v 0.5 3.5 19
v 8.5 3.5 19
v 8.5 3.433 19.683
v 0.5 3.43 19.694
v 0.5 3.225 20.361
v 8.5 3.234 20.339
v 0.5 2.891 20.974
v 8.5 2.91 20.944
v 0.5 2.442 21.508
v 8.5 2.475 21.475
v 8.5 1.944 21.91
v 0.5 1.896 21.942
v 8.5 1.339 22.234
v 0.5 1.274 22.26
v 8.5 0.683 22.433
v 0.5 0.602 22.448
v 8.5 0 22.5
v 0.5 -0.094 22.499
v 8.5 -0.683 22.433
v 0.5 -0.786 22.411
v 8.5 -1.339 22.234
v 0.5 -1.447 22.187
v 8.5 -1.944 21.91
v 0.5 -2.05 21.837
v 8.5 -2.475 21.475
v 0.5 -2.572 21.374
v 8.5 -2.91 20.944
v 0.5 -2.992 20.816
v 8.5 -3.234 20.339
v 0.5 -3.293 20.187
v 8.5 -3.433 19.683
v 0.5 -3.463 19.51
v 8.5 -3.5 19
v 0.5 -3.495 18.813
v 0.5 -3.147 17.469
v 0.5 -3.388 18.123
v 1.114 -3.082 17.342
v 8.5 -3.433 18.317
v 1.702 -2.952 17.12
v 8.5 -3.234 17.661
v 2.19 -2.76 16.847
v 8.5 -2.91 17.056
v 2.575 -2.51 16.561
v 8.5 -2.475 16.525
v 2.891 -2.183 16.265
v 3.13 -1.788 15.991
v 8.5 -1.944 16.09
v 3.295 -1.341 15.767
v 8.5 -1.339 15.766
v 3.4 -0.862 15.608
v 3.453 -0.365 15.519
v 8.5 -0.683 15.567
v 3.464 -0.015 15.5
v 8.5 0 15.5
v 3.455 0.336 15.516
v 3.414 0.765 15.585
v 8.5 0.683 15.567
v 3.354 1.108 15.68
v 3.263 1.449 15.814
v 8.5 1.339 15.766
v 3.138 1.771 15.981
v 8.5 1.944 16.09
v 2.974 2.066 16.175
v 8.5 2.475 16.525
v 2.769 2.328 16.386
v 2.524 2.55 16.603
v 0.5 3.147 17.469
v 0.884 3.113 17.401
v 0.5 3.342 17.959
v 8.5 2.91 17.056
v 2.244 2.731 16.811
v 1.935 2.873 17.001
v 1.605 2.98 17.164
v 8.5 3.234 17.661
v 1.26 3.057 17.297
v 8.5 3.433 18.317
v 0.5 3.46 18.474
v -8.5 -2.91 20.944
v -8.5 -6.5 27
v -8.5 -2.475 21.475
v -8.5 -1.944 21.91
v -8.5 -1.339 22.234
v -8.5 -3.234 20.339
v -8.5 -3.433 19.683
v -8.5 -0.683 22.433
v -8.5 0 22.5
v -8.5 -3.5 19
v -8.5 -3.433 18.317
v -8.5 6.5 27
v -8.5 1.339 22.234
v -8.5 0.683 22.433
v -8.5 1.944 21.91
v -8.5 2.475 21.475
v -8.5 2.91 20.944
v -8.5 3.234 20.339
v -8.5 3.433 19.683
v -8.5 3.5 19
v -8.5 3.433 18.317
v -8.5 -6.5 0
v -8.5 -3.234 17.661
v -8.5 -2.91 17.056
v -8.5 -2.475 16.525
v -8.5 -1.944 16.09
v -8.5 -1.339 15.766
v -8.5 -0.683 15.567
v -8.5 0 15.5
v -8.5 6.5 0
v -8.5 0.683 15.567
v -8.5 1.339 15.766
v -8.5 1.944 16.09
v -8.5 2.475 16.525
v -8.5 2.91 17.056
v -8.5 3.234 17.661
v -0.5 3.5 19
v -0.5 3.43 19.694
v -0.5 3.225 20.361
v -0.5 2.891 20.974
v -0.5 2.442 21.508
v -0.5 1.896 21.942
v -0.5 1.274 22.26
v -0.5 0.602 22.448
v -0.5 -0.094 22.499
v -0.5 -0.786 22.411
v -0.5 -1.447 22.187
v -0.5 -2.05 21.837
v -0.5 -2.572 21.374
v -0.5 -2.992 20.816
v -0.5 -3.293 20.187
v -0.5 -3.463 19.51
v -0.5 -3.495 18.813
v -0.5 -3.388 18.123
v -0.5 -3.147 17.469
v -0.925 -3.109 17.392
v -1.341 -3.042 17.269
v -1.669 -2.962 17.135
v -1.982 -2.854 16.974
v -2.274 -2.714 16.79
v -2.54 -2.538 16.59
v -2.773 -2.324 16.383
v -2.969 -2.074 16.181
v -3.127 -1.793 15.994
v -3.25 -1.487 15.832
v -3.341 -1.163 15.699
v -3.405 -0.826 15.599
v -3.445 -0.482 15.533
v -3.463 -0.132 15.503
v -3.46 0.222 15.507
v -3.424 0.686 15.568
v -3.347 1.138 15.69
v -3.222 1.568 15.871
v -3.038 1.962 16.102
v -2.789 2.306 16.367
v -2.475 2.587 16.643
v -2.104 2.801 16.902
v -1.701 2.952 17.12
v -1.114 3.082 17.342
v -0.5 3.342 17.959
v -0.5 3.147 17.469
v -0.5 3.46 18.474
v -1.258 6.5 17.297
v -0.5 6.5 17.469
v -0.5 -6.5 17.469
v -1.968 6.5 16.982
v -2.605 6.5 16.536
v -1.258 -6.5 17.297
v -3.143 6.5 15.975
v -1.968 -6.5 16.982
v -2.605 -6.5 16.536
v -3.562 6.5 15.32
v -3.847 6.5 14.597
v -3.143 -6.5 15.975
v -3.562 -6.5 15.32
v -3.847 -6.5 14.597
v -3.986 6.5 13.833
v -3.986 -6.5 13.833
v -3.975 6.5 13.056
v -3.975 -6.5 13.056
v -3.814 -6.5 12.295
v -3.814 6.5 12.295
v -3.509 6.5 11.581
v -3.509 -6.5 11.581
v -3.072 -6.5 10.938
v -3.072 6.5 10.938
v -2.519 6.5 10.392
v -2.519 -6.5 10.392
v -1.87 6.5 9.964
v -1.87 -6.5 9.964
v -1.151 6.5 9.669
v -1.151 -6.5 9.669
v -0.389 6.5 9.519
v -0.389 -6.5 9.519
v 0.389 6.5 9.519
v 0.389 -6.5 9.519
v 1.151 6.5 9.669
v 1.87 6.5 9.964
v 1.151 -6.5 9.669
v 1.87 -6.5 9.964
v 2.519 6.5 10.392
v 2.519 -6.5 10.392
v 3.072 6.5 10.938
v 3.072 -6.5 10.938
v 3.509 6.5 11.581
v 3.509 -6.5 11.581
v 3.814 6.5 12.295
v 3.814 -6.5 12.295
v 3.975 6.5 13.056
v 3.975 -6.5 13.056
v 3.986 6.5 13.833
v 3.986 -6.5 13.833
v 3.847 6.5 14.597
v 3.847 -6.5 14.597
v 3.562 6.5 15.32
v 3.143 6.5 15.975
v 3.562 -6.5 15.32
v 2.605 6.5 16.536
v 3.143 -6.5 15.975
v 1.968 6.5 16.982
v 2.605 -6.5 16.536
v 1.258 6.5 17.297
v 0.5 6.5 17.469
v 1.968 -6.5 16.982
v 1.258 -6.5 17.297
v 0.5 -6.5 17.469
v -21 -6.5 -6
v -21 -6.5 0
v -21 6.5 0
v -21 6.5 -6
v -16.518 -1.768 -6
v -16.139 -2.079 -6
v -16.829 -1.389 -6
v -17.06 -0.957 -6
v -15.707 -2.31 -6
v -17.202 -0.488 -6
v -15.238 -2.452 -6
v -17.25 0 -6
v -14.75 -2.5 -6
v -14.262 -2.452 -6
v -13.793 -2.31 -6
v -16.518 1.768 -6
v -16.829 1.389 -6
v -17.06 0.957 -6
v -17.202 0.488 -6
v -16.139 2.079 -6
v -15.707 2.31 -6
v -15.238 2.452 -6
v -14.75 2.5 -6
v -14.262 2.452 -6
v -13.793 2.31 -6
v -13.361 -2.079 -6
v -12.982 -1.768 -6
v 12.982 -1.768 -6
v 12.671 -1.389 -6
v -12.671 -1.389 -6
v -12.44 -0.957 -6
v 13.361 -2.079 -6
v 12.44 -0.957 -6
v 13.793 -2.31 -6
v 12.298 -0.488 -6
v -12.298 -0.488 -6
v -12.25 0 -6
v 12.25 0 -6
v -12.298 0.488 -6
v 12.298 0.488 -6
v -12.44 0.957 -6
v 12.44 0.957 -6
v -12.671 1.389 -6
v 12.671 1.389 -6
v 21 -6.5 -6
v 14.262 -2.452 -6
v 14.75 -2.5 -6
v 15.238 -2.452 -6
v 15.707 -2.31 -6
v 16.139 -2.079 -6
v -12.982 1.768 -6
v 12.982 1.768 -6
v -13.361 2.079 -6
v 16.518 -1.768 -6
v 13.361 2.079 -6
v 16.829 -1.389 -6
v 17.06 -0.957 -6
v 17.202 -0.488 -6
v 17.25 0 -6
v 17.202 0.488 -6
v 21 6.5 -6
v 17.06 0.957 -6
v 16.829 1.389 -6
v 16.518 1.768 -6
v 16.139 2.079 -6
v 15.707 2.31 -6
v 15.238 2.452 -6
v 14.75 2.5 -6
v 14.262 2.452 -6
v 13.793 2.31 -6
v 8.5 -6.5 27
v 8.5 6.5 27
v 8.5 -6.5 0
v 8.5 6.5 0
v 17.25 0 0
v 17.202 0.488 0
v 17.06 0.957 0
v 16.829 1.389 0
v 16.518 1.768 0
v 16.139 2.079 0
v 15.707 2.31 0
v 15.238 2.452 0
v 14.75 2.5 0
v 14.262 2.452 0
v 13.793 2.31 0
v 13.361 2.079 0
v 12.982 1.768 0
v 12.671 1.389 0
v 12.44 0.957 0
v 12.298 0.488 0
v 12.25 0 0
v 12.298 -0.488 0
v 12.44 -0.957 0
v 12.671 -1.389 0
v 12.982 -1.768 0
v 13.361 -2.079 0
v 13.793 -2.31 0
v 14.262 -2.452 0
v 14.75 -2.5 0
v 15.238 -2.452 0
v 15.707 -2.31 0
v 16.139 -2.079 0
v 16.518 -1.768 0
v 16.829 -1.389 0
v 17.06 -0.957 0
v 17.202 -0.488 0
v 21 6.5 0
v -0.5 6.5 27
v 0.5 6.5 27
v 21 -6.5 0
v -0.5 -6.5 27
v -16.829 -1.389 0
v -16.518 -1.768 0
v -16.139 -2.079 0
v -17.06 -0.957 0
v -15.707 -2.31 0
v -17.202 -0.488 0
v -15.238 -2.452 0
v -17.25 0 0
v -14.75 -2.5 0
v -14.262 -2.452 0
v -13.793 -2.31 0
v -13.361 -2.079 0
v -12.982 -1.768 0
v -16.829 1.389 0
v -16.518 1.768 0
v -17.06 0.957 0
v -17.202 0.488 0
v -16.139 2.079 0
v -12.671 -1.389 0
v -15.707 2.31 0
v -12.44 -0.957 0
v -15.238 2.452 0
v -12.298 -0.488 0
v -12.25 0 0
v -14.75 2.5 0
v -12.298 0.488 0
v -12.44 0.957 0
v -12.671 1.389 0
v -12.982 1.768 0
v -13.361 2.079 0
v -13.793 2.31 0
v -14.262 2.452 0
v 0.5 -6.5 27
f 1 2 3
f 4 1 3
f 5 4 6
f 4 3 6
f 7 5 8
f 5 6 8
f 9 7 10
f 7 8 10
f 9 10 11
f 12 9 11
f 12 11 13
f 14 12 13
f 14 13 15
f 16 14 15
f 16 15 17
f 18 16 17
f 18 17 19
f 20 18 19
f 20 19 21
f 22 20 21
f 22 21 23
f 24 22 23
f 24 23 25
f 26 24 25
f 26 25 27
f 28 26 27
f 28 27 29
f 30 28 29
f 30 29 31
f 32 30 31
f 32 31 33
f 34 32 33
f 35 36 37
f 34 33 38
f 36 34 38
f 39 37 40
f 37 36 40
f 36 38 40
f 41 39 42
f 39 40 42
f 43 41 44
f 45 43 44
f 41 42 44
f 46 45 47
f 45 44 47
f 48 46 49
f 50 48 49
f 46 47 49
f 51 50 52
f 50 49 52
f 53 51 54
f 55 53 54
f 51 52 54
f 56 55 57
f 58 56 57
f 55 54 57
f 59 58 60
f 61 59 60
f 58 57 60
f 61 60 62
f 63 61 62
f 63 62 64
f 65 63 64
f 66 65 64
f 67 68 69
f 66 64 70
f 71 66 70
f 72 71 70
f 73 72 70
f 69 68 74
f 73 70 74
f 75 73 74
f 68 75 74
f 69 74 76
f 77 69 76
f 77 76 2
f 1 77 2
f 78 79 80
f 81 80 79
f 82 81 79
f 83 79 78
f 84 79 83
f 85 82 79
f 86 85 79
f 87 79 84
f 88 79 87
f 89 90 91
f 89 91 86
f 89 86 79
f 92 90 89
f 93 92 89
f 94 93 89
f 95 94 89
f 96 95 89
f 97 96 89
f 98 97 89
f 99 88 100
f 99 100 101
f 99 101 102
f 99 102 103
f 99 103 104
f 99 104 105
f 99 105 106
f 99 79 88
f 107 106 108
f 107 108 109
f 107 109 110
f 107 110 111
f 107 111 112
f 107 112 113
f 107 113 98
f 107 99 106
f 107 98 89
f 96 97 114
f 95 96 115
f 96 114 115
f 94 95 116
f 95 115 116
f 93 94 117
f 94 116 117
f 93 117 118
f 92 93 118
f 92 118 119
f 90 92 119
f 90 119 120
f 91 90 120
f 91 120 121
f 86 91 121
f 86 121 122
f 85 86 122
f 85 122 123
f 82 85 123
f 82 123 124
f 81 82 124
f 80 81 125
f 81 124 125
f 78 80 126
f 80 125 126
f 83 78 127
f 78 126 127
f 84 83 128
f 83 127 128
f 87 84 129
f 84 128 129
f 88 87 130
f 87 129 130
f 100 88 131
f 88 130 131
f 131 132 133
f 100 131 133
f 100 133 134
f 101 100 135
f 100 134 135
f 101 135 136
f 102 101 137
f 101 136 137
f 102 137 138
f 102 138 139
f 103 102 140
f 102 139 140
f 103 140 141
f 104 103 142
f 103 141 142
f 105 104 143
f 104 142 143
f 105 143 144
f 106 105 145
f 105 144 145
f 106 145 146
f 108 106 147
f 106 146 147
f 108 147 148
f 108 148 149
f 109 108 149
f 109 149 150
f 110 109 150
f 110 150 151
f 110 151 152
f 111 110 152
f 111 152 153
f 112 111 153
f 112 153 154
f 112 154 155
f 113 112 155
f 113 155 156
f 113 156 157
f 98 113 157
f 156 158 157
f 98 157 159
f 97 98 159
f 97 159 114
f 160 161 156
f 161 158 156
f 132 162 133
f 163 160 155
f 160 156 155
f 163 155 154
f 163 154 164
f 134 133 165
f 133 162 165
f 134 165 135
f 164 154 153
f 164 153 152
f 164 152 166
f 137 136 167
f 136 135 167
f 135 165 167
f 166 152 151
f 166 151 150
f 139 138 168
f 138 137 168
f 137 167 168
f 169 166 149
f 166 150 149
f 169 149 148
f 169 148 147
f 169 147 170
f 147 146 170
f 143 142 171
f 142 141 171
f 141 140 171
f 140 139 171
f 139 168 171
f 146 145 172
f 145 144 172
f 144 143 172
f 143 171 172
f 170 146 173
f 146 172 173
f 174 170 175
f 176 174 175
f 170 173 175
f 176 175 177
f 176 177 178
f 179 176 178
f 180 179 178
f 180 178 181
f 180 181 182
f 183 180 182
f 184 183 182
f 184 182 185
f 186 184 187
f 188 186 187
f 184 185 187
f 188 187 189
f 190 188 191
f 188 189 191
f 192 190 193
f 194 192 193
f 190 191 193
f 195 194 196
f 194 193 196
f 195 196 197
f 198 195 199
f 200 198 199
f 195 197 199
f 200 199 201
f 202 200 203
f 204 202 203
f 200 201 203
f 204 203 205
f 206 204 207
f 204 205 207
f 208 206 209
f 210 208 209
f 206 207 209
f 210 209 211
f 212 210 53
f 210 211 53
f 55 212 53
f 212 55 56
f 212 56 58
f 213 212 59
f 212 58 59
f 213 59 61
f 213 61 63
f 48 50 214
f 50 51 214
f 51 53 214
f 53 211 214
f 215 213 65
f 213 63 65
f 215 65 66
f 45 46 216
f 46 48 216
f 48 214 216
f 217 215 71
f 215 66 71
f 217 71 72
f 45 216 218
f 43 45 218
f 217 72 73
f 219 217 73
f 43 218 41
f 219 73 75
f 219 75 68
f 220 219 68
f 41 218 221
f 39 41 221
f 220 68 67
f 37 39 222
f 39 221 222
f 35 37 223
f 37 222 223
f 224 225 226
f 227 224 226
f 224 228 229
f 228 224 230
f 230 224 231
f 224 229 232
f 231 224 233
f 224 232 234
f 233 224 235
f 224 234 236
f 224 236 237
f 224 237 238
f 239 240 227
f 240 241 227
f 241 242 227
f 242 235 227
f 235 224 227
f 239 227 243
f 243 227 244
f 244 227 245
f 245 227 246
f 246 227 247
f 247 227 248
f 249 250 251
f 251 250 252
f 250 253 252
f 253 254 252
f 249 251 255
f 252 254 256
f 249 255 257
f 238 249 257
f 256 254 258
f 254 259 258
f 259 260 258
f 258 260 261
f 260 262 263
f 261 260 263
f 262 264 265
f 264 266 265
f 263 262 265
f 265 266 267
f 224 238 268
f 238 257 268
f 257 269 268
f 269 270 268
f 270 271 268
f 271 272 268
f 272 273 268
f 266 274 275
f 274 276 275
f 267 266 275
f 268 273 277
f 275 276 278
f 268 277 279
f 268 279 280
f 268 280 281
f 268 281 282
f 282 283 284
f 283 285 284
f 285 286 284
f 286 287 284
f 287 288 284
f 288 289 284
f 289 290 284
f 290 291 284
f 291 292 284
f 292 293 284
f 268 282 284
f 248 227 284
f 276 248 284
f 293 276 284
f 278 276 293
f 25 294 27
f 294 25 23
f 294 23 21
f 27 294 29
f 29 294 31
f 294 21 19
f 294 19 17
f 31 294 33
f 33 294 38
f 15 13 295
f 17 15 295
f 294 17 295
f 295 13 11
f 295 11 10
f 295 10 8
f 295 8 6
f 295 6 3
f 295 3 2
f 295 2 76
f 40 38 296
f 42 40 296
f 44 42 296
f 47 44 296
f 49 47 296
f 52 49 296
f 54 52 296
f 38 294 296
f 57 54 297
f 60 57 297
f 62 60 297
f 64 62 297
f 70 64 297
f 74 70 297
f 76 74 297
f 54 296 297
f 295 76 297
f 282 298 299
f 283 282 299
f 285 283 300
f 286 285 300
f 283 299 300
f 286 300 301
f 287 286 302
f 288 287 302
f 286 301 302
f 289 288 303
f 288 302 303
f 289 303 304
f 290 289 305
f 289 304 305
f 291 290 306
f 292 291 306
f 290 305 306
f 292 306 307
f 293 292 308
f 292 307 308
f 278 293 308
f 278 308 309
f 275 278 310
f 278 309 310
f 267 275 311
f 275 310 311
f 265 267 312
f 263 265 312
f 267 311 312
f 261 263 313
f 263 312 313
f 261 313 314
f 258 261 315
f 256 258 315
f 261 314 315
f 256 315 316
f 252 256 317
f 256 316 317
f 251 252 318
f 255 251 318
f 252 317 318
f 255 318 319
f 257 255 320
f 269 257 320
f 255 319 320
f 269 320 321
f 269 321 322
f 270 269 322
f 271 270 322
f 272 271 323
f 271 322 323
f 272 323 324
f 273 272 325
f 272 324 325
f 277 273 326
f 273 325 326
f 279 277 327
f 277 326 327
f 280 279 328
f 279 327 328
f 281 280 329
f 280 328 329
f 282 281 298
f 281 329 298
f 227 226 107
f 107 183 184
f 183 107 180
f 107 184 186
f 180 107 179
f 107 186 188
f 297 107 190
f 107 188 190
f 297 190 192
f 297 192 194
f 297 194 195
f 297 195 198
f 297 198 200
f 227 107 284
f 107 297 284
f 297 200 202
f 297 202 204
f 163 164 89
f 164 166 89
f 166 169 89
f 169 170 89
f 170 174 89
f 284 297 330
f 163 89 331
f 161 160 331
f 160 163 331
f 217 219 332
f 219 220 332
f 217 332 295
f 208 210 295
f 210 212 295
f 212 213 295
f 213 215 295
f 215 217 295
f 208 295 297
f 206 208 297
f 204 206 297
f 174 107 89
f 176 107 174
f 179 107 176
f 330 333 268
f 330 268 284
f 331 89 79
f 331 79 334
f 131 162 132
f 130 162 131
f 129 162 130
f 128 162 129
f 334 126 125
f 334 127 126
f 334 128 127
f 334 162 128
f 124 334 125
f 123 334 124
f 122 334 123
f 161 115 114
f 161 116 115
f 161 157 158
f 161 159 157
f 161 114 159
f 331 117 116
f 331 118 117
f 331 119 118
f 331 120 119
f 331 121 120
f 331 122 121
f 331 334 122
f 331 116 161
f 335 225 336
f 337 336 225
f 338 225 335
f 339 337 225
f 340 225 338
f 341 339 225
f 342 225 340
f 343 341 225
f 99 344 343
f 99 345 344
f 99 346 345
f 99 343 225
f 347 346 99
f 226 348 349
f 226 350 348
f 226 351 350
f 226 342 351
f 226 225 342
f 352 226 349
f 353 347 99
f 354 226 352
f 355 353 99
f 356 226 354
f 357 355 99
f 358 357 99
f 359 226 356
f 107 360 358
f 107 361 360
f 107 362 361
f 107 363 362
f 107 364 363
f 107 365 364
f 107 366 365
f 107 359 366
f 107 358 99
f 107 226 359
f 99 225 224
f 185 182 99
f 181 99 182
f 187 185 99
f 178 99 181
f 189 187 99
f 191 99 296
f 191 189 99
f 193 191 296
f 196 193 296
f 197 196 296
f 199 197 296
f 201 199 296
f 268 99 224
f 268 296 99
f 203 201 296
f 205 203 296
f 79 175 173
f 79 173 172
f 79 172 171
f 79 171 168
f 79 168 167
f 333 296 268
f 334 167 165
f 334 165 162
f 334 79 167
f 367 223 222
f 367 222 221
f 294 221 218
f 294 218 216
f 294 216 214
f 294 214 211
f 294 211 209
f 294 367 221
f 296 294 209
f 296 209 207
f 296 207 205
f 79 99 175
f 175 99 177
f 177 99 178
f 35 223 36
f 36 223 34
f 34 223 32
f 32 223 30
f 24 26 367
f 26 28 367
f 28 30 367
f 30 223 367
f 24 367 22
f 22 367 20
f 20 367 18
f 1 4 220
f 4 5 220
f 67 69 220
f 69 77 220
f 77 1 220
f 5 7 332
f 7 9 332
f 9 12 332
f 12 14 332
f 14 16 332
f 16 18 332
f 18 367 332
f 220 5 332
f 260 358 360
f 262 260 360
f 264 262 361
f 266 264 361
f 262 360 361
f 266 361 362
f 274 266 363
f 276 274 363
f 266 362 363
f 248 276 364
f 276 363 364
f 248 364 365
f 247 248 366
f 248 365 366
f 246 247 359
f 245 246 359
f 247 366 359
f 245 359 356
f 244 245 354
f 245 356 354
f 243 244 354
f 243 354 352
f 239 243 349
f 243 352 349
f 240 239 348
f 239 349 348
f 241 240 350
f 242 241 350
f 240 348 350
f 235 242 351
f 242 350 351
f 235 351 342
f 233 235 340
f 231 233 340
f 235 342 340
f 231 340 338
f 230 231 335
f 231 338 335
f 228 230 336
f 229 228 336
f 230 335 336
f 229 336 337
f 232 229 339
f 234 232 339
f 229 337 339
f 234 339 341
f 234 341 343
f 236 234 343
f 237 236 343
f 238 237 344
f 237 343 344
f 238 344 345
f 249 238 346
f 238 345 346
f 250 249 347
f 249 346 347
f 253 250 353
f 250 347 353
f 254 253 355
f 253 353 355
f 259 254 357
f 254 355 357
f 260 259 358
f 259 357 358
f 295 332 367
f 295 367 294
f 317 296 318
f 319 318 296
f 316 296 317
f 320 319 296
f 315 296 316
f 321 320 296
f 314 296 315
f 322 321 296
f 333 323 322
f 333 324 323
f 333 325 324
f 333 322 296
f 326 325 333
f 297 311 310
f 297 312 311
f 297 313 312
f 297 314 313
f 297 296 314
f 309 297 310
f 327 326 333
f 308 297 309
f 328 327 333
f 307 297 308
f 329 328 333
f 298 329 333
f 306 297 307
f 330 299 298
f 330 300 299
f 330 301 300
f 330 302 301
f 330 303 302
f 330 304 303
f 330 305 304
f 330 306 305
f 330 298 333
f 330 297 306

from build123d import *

# Parameters (mm, degrees)
F0_W      = 42
F0_H      = 13
F1_DEPTH  = 6
F2_W      = 17
F2_H      = 13
F5_DEPTH  = 27
F3_R      = 2.5
F6_DEPTH  = 6
F4_R      = 2.5
F7_DEPTH  = 6
F8_R      = 4
F9_DEPTH  = 15
F10_R     = 3.5
F11_DEPTH = 20
F12_W     = 1
F12_H     = 13
F13_DEPTH = 13


with BuildPart() as f1:
    # F0 (on Top) → F1 (new body)
    with BuildSketch(Plane.XY):
        Rectangle(F0_W, F0_H)
    extrude(amount=-F1_DEPTH)

    # F2 (on Top) → F5 (join)
    with BuildSketch(Plane.XY):
        Rectangle(F2_W, F2_H)
    extrude(amount=F5_DEPTH)

    # F3 (on Top) → F6 (cut)
    with BuildSketch(Plane.XY):
        with Locations((14.75, 0)):
            Circle(F3_R)
    extrude(amount=-F6_DEPTH, mode=Mode.SUBTRACT)

    # F4 (on Top) → F7 (cut)
    with BuildSketch(Plane.XY):
        with Locations((-14.75, 0)):
            Circle(F4_R)
    extrude(amount=-F7_DEPTH, mode=Mode.SUBTRACT)

    # F8 (on face) → F9 (cut)
    with BuildSketch(Plane.XZ.offset(6.5)):
        with Locations((0, 13.5)):
            Circle(F8_R)
    extrude(amount=-F9_DEPTH, mode=Mode.SUBTRACT)

    # F10 (on face) → F11 (cut)
    with BuildSketch(Plane.YZ.offset(8.5)):
        with Locations((0, 19)):
            Circle(F10_R)
    extrude(amount=-F11_DEPTH, mode=Mode.SUBTRACT)

    # F12 (on face) → F13 (cut)
    with BuildSketch(Plane.XY.offset(27)):
        Rectangle(F12_W, F12_H)
    extrude(amount=-F13_DEPTH, mode=Mode.SUBTRACT)


solid = f1.part
